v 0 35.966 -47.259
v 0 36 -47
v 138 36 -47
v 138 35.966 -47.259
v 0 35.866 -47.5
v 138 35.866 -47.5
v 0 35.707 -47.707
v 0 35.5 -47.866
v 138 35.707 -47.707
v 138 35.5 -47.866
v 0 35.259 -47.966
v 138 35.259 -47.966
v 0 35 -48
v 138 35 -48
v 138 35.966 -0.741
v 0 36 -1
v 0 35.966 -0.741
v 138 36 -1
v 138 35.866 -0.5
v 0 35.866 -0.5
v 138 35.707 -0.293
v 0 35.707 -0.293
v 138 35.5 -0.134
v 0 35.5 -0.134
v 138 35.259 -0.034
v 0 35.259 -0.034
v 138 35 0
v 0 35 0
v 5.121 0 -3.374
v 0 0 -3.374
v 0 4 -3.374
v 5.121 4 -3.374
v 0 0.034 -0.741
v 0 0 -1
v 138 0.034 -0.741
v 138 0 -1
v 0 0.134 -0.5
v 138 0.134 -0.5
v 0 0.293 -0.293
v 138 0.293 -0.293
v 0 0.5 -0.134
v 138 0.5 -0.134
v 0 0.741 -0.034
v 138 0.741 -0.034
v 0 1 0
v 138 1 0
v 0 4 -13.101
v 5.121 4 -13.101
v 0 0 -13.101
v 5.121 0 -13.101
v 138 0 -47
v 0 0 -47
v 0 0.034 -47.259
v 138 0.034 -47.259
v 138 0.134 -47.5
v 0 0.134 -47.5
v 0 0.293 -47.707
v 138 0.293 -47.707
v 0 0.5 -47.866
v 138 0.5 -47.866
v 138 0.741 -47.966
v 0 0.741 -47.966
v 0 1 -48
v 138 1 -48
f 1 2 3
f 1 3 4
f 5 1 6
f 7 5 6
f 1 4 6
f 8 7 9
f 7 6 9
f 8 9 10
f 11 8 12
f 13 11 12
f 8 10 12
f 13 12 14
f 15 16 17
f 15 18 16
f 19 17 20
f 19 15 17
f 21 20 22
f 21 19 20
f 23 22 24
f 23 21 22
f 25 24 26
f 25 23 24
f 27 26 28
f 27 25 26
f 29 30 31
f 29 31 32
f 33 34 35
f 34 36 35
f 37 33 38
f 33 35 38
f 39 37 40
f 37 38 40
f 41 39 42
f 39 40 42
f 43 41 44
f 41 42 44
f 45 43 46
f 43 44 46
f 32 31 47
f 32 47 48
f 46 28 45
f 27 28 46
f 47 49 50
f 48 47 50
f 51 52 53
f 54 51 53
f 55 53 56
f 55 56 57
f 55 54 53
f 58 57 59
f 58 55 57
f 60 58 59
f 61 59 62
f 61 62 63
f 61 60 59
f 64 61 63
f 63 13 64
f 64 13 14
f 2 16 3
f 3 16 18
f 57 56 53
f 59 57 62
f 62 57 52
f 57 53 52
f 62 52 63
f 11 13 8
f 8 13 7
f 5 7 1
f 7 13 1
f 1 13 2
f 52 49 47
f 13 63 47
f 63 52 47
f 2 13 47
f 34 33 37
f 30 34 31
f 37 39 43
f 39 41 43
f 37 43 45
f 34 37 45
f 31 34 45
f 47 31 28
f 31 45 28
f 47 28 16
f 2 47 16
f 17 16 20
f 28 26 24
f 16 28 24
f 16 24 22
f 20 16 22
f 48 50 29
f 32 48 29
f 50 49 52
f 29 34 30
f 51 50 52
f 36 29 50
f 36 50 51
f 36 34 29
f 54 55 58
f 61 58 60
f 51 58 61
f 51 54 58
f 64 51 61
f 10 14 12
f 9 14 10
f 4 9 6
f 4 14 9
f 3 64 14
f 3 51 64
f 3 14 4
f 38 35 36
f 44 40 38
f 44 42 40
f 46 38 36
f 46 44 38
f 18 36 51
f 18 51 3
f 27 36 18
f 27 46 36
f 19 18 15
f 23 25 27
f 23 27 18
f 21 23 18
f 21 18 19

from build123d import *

# Parameters (mm, degrees)
SKETCH1_W           = 138
SKETCH1_H           = 36
BOSS_EXTRUDE1_DEPTH = 48
FILLET2_R           = 1
SKETCH2_W           = 5.121114637
SKETCH2_H           = 9.72723973
CUT_EXTRUDE1_DEPTH  = 4


with BuildPart() as part:
    # Sketch1 → Boss-Extrude1 (new body)
    with BuildSketch(Plane.XY):
        with Locations((69, 18)):
            Rectangle(SKETCH1_W, SKETCH1_H)
    extrude(amount=-BOSS_EXTRUDE1_DEPTH)

    # Fillet2
    fillet2_edges = [part.edges().sort_by_distance(p)[0] for p in [
        (69, 36, -48),
        (69, 36, 0),
        (69, 0, 0),
        (69, 0, -48),
    ]]
    fillet(fillet2_edges, radius=FILLET2_R)

    # Sketch2 → Cut-Extrude1 (cut)
    with BuildSketch(Plane.XZ):
        with Locations((2.560557319, -8.237193023)):
            Rectangle(SKETCH2_W, SKETCH2_H)
    extrude(amount=-CUT_EXTRUDE1_DEPTH, mode=Mode.SUBTRACT)


solid = part.part
